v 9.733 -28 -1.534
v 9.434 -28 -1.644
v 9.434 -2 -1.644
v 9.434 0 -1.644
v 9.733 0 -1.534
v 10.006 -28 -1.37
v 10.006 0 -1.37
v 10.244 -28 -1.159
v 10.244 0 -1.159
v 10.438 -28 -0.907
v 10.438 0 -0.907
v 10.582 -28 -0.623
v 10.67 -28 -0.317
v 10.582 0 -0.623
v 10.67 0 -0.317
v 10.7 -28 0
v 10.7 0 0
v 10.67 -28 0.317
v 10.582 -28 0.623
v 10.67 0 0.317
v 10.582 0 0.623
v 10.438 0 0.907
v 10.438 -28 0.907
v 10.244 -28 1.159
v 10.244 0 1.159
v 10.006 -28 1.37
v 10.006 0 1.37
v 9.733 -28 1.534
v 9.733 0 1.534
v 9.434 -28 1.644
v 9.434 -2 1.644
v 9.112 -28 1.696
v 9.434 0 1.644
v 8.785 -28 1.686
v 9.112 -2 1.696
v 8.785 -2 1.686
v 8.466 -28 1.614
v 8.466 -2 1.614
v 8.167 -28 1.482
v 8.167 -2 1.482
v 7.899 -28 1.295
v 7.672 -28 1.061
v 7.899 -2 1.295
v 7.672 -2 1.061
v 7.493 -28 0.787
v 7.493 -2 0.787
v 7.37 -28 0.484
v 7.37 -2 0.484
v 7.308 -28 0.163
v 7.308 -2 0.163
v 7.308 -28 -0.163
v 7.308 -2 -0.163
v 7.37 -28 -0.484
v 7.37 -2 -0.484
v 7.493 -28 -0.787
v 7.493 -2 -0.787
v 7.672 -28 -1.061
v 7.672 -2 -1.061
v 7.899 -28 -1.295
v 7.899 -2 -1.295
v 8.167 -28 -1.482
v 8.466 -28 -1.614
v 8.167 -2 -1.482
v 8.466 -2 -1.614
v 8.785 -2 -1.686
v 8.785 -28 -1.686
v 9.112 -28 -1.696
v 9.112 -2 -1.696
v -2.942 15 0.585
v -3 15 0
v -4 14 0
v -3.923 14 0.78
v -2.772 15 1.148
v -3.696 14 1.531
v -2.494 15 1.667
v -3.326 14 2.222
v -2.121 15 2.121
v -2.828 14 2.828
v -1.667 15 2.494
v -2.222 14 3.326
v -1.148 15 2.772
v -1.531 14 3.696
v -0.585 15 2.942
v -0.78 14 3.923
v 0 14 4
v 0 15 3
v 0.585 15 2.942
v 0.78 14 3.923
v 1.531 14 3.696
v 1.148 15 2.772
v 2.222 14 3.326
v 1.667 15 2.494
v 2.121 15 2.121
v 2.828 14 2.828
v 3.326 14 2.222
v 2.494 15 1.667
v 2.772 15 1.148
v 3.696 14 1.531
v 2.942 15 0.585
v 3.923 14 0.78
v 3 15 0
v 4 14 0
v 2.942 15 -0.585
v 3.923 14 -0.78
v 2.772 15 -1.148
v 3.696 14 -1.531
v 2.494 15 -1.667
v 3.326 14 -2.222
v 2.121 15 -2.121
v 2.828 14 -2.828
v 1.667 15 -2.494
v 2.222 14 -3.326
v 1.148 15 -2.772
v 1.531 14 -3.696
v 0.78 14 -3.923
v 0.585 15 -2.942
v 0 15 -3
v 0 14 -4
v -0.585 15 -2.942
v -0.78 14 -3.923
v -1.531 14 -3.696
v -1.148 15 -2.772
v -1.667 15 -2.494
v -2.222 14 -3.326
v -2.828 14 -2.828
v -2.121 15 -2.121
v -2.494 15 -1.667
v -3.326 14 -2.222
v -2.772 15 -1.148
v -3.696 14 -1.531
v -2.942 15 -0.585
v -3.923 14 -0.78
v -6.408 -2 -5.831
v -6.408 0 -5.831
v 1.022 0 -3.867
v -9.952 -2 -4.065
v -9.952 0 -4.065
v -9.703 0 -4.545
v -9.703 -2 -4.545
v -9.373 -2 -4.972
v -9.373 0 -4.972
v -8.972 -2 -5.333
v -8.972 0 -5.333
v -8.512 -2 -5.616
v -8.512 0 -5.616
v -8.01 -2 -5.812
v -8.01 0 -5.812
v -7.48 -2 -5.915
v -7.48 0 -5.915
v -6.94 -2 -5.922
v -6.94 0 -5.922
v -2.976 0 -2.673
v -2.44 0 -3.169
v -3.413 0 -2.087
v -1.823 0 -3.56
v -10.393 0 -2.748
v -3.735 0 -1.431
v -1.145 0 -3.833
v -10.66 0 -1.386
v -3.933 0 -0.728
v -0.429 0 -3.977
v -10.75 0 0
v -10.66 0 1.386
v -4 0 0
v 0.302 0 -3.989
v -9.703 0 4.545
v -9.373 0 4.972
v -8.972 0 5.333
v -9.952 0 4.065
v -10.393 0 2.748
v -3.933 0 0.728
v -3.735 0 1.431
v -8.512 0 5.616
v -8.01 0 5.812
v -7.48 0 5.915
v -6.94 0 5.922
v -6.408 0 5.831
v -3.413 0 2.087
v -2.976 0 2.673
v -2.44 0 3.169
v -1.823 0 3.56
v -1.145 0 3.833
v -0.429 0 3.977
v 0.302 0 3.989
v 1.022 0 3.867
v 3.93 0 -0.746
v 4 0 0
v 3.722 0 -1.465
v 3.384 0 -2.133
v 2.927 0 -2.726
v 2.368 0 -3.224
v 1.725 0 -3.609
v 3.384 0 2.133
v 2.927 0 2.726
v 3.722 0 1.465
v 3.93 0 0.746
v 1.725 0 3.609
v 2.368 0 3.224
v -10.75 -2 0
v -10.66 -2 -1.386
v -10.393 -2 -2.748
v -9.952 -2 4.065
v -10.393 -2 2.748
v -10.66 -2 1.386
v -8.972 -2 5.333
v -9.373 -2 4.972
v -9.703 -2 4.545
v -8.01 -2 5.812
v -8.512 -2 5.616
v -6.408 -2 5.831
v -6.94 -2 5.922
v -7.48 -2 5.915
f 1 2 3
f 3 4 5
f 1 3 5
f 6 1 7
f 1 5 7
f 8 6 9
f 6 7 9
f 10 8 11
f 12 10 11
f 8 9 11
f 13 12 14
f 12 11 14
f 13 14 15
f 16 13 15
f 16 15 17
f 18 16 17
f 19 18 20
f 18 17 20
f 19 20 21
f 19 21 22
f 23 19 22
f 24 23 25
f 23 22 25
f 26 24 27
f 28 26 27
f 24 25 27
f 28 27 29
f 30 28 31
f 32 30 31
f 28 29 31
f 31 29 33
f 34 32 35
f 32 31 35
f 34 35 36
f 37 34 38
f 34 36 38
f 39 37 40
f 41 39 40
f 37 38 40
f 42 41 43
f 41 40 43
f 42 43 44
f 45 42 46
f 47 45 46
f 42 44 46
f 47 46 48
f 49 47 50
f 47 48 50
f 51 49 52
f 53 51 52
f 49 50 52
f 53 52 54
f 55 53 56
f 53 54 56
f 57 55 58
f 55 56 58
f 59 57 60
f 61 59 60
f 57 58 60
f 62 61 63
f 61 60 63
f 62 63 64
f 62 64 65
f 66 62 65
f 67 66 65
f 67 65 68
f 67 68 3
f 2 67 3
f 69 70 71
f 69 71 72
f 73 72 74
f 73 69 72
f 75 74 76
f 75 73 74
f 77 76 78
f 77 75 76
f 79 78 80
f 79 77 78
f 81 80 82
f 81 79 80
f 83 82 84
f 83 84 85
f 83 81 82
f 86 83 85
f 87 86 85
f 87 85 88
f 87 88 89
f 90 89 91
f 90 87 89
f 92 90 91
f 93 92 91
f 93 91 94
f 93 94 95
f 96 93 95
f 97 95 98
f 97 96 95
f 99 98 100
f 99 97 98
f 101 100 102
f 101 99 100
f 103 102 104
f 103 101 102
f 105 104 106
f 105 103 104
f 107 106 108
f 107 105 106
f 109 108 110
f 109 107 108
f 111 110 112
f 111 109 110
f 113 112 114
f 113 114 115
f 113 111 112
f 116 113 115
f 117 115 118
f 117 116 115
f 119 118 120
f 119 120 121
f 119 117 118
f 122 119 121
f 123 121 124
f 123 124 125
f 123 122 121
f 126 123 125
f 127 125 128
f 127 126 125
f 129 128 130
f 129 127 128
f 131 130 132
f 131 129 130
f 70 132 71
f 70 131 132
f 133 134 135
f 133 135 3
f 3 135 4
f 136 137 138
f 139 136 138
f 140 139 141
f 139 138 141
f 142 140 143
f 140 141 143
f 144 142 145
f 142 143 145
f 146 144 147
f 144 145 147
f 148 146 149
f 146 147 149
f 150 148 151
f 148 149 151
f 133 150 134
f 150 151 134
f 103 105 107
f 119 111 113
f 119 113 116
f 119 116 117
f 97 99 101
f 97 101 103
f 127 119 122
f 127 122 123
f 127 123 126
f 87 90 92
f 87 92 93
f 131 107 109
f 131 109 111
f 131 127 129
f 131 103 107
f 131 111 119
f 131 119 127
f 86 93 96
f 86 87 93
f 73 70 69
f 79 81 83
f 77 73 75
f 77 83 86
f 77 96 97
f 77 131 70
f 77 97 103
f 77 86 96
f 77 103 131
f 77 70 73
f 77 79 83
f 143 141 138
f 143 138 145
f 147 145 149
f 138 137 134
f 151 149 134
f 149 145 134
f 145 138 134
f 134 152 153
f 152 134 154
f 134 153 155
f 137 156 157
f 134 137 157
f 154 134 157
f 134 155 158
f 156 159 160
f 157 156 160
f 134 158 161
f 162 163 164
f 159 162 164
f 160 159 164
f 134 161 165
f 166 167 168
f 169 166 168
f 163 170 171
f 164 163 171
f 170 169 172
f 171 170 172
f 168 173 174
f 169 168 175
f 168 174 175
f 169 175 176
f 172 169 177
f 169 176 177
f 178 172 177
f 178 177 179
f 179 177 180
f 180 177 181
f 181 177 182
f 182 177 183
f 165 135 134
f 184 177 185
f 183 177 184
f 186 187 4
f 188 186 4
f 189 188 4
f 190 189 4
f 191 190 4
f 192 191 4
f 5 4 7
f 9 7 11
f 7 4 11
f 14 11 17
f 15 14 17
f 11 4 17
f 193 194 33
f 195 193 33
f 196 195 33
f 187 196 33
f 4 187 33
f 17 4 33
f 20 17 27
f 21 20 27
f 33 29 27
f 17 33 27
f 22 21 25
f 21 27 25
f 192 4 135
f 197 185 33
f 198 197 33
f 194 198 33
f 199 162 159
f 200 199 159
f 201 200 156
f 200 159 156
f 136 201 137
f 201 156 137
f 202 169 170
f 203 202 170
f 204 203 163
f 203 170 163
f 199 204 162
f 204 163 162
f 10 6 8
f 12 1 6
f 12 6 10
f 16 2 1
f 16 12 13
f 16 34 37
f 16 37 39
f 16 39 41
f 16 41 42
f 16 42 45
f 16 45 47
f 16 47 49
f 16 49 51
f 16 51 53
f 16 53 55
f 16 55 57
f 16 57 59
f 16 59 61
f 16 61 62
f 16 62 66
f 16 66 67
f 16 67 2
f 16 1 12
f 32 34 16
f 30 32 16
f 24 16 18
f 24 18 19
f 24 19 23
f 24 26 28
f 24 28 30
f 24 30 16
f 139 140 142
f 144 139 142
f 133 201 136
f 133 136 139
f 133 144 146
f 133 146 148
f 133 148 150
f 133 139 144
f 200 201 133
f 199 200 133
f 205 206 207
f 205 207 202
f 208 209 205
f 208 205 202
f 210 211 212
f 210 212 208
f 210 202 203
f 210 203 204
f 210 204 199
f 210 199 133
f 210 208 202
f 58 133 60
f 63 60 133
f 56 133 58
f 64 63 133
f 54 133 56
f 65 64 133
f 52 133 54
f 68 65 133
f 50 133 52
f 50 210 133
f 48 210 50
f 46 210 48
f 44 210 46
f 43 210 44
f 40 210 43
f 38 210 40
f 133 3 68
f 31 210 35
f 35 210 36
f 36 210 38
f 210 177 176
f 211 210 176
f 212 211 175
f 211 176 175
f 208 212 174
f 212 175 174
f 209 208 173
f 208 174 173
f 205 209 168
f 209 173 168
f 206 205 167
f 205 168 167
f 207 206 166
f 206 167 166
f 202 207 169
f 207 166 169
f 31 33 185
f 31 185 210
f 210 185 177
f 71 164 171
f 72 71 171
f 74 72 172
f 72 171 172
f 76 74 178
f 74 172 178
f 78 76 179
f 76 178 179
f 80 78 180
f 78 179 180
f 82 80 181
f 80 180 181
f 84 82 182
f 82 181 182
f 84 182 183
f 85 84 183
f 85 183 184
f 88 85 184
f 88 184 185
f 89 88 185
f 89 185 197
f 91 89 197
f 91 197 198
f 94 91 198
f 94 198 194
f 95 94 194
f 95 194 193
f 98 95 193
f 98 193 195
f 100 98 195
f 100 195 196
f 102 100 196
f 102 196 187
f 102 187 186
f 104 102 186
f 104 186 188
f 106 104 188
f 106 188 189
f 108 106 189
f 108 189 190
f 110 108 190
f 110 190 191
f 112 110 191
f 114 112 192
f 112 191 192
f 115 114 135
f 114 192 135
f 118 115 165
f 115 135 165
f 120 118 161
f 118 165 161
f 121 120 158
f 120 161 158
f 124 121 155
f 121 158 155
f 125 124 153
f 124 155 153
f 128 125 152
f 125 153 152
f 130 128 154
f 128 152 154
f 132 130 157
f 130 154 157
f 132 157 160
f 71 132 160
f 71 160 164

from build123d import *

# Parameters (mm, degrees)
F1_DEPTH = 2
F3_DEPTH = 26
F4_R     = 4
F5_DEPTH = 15
F6_SIZE  = 1


with BuildPart() as f1:
    # F0 (on Front) → F1 (new body)
    with BuildSketch(Plane.XZ):
        with BuildLine():
            ThreePointArc((9.4344444444, -1.6435504327), (10.3469512901, -1.0371702957), (10.7, 0))
            ThreePointArc((10.7, 0), (10.3469512901, 1.0371702957), (9.4344444444, 1.6435504327))
            Line((9.4344444444, 1.6435504327), (-6.407798527, 5.8311763854))
            ThreePointArc((-6.407798527, 5.8311763854), (-8.5124333236, 5.6159080306), (-9.9516775266, 4.0652938892))
            ThreePointArc((-9.9516775266, 4.0652938892), (-10.5485314952, 2.0714688736), (-10.75, 0))
            ThreePointArc((-10.75, 0), (-10.5485314952, -2.0714688736), (-9.9516775266, -4.0652938892))
            ThreePointArc((-9.9516775266, -4.0652938892), (-8.5124333236, -5.6159080306), (-6.407798527, -5.8311763854))
            Line((-6.407798527, -5.8311763854), (9.4344444444, -1.6435504327))
        make_face()
    extrude(amount=F1_DEPTH)

    # F2 (on face) → F3 (join)
    with BuildSketch(Plane.XZ.offset(2)):
        with BuildLine():
            ThreePointArc((9.4344444444, -1.6435504327), (10.3469512901, -1.0371702957), (10.7, 0))
            ThreePointArc((10.7, 0), (10.3469512901, 1.0371702957), (9.4344444444, 1.6435504327))
            ThreePointArc((9.4344444444, 1.6435504327), (7.3, 0), (9.4344444444, -1.6435504327))
        make_face()
    extrude(amount=F3_DEPTH)

    # F4 (on face) → F5 (join)
    with BuildSketch(Plane(origin=(0, 0, 0), x_dir=(-1, 0, 0), z_dir=(0, 1, 0))):
        Circle(F4_R)
    extrude(amount=F5_DEPTH)

    # F6
    f6_edges = [f1.edges().sort_by_distance(p)[0] for p in [
        (4, 15, 0),
    ]]
    chamfer(f6_edges, length=F6_SIZE)


solid = f1.part
